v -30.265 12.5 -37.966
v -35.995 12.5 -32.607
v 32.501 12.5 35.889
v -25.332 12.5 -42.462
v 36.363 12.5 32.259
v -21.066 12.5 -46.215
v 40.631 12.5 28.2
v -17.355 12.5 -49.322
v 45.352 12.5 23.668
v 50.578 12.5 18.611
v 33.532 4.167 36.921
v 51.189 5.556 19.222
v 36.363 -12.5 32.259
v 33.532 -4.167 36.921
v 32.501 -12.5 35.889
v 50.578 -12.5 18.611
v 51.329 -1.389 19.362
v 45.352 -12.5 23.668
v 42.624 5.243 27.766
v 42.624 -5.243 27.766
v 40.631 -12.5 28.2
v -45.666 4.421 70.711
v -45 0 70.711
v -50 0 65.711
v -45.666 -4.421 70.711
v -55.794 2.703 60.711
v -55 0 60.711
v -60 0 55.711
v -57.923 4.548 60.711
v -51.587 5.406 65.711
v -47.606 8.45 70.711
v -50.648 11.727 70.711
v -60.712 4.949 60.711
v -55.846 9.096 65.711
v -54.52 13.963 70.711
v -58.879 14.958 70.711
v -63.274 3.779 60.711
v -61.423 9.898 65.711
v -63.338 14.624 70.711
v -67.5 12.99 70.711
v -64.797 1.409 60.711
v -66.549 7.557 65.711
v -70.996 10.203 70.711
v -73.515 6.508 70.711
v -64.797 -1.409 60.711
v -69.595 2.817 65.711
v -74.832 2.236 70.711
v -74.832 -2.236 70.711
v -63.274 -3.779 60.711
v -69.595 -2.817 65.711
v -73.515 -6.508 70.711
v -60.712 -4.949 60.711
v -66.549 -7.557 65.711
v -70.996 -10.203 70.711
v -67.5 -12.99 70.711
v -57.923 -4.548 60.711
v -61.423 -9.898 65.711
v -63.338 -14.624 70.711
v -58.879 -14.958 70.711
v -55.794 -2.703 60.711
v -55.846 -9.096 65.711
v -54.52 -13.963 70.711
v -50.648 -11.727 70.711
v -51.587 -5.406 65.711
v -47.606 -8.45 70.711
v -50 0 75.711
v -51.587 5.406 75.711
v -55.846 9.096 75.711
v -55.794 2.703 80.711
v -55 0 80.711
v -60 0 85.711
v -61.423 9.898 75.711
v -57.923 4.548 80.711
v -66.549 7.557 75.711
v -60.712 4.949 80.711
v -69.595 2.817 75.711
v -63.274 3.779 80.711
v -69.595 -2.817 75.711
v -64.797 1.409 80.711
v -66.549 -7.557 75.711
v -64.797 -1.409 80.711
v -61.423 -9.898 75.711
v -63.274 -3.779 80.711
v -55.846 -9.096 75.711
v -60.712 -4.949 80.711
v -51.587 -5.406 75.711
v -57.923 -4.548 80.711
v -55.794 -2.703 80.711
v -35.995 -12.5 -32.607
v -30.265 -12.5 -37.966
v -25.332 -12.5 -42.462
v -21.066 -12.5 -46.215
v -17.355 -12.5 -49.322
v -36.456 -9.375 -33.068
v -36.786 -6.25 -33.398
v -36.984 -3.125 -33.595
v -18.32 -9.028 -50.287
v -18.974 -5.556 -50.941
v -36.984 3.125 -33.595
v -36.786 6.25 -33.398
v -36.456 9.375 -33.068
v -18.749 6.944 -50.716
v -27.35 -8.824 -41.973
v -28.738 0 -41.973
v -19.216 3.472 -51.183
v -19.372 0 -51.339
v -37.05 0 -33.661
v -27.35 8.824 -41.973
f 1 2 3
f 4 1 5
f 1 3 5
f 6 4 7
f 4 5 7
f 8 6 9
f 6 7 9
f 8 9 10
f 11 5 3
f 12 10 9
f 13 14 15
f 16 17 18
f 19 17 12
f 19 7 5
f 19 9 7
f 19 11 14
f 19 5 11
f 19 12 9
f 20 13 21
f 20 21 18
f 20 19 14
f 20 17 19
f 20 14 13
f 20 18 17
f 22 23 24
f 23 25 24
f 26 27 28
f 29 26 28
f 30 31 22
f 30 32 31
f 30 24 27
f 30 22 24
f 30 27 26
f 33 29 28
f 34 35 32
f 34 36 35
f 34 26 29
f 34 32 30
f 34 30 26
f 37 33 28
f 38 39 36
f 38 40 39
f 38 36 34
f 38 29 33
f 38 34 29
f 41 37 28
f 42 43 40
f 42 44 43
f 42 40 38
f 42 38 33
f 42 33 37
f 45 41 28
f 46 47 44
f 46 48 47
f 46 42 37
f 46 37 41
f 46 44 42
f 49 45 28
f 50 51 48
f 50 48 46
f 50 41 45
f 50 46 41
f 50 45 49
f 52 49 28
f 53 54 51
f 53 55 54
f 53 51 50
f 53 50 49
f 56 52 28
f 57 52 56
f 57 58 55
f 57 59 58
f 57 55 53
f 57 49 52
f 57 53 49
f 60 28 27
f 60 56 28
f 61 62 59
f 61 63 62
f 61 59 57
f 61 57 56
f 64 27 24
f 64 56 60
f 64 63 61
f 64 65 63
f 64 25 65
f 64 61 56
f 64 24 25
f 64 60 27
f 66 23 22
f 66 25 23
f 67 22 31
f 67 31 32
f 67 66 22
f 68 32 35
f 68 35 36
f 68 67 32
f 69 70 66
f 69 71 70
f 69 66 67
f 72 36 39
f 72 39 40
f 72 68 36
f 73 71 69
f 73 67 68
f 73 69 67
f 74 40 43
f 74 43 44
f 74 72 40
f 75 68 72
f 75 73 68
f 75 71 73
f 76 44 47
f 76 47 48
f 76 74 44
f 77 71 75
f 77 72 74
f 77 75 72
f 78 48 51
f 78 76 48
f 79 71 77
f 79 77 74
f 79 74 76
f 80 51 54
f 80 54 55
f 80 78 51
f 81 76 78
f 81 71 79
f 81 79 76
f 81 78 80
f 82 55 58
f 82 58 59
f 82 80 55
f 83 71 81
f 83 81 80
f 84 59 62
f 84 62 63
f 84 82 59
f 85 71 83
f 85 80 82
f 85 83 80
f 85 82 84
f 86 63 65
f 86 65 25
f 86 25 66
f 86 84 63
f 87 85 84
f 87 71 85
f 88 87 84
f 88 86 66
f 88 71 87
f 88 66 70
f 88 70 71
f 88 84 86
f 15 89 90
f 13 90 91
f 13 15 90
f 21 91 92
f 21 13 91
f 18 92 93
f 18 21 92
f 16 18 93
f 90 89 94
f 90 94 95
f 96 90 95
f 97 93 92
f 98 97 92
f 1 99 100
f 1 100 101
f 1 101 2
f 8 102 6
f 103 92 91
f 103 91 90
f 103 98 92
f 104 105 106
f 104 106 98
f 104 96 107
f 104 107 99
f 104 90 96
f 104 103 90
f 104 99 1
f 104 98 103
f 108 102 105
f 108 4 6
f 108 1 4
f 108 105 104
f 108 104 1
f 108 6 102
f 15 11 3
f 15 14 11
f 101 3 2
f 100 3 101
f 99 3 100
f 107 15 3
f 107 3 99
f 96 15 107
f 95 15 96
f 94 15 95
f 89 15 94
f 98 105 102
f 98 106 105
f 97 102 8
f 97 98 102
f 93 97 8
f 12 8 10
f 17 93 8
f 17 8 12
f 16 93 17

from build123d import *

# Parameters (mm, degrees)
F5_DEPTH = 12.5


with BuildPart() as f1:
    # F0 (on Front) → F1 (revolve)
    with BuildSketch(Plane.XZ):
        Polygon((0, -70.710678), (0, 70.710678), (-70.710678, 0), align=None)
    revolve(axis=Axis((0, 0, -1.175915), (0, 0, -1)))


with BuildPart() as f3:
    # F2 (on Front) → F3 (revolve)
    with BuildSketch(Plane.XZ):
        Polygon((-60, 55.710678), (-45, 70.710678), (-60, 85.710678), align=None)
    revolve(axis=Axis((-60, 0, 69.177093), (0, 0, 1)))


with BuildPart() as f5:
    # F4 (on Front) → F5 (new body, symmetric)
    with BuildSketch(Plane.XZ):
        Polygon((67.67767, 35.710678), (50, 53.388348), (-56.066017, -52.67767), (-38.388348, -70.355339), align=None)
    extrude(amount=F5_DEPTH, both=True)

    # F6: intersect F1
    add(f1.part, mode=Mode.INTERSECT)


solid = Compound([f3.part, f5.part])
